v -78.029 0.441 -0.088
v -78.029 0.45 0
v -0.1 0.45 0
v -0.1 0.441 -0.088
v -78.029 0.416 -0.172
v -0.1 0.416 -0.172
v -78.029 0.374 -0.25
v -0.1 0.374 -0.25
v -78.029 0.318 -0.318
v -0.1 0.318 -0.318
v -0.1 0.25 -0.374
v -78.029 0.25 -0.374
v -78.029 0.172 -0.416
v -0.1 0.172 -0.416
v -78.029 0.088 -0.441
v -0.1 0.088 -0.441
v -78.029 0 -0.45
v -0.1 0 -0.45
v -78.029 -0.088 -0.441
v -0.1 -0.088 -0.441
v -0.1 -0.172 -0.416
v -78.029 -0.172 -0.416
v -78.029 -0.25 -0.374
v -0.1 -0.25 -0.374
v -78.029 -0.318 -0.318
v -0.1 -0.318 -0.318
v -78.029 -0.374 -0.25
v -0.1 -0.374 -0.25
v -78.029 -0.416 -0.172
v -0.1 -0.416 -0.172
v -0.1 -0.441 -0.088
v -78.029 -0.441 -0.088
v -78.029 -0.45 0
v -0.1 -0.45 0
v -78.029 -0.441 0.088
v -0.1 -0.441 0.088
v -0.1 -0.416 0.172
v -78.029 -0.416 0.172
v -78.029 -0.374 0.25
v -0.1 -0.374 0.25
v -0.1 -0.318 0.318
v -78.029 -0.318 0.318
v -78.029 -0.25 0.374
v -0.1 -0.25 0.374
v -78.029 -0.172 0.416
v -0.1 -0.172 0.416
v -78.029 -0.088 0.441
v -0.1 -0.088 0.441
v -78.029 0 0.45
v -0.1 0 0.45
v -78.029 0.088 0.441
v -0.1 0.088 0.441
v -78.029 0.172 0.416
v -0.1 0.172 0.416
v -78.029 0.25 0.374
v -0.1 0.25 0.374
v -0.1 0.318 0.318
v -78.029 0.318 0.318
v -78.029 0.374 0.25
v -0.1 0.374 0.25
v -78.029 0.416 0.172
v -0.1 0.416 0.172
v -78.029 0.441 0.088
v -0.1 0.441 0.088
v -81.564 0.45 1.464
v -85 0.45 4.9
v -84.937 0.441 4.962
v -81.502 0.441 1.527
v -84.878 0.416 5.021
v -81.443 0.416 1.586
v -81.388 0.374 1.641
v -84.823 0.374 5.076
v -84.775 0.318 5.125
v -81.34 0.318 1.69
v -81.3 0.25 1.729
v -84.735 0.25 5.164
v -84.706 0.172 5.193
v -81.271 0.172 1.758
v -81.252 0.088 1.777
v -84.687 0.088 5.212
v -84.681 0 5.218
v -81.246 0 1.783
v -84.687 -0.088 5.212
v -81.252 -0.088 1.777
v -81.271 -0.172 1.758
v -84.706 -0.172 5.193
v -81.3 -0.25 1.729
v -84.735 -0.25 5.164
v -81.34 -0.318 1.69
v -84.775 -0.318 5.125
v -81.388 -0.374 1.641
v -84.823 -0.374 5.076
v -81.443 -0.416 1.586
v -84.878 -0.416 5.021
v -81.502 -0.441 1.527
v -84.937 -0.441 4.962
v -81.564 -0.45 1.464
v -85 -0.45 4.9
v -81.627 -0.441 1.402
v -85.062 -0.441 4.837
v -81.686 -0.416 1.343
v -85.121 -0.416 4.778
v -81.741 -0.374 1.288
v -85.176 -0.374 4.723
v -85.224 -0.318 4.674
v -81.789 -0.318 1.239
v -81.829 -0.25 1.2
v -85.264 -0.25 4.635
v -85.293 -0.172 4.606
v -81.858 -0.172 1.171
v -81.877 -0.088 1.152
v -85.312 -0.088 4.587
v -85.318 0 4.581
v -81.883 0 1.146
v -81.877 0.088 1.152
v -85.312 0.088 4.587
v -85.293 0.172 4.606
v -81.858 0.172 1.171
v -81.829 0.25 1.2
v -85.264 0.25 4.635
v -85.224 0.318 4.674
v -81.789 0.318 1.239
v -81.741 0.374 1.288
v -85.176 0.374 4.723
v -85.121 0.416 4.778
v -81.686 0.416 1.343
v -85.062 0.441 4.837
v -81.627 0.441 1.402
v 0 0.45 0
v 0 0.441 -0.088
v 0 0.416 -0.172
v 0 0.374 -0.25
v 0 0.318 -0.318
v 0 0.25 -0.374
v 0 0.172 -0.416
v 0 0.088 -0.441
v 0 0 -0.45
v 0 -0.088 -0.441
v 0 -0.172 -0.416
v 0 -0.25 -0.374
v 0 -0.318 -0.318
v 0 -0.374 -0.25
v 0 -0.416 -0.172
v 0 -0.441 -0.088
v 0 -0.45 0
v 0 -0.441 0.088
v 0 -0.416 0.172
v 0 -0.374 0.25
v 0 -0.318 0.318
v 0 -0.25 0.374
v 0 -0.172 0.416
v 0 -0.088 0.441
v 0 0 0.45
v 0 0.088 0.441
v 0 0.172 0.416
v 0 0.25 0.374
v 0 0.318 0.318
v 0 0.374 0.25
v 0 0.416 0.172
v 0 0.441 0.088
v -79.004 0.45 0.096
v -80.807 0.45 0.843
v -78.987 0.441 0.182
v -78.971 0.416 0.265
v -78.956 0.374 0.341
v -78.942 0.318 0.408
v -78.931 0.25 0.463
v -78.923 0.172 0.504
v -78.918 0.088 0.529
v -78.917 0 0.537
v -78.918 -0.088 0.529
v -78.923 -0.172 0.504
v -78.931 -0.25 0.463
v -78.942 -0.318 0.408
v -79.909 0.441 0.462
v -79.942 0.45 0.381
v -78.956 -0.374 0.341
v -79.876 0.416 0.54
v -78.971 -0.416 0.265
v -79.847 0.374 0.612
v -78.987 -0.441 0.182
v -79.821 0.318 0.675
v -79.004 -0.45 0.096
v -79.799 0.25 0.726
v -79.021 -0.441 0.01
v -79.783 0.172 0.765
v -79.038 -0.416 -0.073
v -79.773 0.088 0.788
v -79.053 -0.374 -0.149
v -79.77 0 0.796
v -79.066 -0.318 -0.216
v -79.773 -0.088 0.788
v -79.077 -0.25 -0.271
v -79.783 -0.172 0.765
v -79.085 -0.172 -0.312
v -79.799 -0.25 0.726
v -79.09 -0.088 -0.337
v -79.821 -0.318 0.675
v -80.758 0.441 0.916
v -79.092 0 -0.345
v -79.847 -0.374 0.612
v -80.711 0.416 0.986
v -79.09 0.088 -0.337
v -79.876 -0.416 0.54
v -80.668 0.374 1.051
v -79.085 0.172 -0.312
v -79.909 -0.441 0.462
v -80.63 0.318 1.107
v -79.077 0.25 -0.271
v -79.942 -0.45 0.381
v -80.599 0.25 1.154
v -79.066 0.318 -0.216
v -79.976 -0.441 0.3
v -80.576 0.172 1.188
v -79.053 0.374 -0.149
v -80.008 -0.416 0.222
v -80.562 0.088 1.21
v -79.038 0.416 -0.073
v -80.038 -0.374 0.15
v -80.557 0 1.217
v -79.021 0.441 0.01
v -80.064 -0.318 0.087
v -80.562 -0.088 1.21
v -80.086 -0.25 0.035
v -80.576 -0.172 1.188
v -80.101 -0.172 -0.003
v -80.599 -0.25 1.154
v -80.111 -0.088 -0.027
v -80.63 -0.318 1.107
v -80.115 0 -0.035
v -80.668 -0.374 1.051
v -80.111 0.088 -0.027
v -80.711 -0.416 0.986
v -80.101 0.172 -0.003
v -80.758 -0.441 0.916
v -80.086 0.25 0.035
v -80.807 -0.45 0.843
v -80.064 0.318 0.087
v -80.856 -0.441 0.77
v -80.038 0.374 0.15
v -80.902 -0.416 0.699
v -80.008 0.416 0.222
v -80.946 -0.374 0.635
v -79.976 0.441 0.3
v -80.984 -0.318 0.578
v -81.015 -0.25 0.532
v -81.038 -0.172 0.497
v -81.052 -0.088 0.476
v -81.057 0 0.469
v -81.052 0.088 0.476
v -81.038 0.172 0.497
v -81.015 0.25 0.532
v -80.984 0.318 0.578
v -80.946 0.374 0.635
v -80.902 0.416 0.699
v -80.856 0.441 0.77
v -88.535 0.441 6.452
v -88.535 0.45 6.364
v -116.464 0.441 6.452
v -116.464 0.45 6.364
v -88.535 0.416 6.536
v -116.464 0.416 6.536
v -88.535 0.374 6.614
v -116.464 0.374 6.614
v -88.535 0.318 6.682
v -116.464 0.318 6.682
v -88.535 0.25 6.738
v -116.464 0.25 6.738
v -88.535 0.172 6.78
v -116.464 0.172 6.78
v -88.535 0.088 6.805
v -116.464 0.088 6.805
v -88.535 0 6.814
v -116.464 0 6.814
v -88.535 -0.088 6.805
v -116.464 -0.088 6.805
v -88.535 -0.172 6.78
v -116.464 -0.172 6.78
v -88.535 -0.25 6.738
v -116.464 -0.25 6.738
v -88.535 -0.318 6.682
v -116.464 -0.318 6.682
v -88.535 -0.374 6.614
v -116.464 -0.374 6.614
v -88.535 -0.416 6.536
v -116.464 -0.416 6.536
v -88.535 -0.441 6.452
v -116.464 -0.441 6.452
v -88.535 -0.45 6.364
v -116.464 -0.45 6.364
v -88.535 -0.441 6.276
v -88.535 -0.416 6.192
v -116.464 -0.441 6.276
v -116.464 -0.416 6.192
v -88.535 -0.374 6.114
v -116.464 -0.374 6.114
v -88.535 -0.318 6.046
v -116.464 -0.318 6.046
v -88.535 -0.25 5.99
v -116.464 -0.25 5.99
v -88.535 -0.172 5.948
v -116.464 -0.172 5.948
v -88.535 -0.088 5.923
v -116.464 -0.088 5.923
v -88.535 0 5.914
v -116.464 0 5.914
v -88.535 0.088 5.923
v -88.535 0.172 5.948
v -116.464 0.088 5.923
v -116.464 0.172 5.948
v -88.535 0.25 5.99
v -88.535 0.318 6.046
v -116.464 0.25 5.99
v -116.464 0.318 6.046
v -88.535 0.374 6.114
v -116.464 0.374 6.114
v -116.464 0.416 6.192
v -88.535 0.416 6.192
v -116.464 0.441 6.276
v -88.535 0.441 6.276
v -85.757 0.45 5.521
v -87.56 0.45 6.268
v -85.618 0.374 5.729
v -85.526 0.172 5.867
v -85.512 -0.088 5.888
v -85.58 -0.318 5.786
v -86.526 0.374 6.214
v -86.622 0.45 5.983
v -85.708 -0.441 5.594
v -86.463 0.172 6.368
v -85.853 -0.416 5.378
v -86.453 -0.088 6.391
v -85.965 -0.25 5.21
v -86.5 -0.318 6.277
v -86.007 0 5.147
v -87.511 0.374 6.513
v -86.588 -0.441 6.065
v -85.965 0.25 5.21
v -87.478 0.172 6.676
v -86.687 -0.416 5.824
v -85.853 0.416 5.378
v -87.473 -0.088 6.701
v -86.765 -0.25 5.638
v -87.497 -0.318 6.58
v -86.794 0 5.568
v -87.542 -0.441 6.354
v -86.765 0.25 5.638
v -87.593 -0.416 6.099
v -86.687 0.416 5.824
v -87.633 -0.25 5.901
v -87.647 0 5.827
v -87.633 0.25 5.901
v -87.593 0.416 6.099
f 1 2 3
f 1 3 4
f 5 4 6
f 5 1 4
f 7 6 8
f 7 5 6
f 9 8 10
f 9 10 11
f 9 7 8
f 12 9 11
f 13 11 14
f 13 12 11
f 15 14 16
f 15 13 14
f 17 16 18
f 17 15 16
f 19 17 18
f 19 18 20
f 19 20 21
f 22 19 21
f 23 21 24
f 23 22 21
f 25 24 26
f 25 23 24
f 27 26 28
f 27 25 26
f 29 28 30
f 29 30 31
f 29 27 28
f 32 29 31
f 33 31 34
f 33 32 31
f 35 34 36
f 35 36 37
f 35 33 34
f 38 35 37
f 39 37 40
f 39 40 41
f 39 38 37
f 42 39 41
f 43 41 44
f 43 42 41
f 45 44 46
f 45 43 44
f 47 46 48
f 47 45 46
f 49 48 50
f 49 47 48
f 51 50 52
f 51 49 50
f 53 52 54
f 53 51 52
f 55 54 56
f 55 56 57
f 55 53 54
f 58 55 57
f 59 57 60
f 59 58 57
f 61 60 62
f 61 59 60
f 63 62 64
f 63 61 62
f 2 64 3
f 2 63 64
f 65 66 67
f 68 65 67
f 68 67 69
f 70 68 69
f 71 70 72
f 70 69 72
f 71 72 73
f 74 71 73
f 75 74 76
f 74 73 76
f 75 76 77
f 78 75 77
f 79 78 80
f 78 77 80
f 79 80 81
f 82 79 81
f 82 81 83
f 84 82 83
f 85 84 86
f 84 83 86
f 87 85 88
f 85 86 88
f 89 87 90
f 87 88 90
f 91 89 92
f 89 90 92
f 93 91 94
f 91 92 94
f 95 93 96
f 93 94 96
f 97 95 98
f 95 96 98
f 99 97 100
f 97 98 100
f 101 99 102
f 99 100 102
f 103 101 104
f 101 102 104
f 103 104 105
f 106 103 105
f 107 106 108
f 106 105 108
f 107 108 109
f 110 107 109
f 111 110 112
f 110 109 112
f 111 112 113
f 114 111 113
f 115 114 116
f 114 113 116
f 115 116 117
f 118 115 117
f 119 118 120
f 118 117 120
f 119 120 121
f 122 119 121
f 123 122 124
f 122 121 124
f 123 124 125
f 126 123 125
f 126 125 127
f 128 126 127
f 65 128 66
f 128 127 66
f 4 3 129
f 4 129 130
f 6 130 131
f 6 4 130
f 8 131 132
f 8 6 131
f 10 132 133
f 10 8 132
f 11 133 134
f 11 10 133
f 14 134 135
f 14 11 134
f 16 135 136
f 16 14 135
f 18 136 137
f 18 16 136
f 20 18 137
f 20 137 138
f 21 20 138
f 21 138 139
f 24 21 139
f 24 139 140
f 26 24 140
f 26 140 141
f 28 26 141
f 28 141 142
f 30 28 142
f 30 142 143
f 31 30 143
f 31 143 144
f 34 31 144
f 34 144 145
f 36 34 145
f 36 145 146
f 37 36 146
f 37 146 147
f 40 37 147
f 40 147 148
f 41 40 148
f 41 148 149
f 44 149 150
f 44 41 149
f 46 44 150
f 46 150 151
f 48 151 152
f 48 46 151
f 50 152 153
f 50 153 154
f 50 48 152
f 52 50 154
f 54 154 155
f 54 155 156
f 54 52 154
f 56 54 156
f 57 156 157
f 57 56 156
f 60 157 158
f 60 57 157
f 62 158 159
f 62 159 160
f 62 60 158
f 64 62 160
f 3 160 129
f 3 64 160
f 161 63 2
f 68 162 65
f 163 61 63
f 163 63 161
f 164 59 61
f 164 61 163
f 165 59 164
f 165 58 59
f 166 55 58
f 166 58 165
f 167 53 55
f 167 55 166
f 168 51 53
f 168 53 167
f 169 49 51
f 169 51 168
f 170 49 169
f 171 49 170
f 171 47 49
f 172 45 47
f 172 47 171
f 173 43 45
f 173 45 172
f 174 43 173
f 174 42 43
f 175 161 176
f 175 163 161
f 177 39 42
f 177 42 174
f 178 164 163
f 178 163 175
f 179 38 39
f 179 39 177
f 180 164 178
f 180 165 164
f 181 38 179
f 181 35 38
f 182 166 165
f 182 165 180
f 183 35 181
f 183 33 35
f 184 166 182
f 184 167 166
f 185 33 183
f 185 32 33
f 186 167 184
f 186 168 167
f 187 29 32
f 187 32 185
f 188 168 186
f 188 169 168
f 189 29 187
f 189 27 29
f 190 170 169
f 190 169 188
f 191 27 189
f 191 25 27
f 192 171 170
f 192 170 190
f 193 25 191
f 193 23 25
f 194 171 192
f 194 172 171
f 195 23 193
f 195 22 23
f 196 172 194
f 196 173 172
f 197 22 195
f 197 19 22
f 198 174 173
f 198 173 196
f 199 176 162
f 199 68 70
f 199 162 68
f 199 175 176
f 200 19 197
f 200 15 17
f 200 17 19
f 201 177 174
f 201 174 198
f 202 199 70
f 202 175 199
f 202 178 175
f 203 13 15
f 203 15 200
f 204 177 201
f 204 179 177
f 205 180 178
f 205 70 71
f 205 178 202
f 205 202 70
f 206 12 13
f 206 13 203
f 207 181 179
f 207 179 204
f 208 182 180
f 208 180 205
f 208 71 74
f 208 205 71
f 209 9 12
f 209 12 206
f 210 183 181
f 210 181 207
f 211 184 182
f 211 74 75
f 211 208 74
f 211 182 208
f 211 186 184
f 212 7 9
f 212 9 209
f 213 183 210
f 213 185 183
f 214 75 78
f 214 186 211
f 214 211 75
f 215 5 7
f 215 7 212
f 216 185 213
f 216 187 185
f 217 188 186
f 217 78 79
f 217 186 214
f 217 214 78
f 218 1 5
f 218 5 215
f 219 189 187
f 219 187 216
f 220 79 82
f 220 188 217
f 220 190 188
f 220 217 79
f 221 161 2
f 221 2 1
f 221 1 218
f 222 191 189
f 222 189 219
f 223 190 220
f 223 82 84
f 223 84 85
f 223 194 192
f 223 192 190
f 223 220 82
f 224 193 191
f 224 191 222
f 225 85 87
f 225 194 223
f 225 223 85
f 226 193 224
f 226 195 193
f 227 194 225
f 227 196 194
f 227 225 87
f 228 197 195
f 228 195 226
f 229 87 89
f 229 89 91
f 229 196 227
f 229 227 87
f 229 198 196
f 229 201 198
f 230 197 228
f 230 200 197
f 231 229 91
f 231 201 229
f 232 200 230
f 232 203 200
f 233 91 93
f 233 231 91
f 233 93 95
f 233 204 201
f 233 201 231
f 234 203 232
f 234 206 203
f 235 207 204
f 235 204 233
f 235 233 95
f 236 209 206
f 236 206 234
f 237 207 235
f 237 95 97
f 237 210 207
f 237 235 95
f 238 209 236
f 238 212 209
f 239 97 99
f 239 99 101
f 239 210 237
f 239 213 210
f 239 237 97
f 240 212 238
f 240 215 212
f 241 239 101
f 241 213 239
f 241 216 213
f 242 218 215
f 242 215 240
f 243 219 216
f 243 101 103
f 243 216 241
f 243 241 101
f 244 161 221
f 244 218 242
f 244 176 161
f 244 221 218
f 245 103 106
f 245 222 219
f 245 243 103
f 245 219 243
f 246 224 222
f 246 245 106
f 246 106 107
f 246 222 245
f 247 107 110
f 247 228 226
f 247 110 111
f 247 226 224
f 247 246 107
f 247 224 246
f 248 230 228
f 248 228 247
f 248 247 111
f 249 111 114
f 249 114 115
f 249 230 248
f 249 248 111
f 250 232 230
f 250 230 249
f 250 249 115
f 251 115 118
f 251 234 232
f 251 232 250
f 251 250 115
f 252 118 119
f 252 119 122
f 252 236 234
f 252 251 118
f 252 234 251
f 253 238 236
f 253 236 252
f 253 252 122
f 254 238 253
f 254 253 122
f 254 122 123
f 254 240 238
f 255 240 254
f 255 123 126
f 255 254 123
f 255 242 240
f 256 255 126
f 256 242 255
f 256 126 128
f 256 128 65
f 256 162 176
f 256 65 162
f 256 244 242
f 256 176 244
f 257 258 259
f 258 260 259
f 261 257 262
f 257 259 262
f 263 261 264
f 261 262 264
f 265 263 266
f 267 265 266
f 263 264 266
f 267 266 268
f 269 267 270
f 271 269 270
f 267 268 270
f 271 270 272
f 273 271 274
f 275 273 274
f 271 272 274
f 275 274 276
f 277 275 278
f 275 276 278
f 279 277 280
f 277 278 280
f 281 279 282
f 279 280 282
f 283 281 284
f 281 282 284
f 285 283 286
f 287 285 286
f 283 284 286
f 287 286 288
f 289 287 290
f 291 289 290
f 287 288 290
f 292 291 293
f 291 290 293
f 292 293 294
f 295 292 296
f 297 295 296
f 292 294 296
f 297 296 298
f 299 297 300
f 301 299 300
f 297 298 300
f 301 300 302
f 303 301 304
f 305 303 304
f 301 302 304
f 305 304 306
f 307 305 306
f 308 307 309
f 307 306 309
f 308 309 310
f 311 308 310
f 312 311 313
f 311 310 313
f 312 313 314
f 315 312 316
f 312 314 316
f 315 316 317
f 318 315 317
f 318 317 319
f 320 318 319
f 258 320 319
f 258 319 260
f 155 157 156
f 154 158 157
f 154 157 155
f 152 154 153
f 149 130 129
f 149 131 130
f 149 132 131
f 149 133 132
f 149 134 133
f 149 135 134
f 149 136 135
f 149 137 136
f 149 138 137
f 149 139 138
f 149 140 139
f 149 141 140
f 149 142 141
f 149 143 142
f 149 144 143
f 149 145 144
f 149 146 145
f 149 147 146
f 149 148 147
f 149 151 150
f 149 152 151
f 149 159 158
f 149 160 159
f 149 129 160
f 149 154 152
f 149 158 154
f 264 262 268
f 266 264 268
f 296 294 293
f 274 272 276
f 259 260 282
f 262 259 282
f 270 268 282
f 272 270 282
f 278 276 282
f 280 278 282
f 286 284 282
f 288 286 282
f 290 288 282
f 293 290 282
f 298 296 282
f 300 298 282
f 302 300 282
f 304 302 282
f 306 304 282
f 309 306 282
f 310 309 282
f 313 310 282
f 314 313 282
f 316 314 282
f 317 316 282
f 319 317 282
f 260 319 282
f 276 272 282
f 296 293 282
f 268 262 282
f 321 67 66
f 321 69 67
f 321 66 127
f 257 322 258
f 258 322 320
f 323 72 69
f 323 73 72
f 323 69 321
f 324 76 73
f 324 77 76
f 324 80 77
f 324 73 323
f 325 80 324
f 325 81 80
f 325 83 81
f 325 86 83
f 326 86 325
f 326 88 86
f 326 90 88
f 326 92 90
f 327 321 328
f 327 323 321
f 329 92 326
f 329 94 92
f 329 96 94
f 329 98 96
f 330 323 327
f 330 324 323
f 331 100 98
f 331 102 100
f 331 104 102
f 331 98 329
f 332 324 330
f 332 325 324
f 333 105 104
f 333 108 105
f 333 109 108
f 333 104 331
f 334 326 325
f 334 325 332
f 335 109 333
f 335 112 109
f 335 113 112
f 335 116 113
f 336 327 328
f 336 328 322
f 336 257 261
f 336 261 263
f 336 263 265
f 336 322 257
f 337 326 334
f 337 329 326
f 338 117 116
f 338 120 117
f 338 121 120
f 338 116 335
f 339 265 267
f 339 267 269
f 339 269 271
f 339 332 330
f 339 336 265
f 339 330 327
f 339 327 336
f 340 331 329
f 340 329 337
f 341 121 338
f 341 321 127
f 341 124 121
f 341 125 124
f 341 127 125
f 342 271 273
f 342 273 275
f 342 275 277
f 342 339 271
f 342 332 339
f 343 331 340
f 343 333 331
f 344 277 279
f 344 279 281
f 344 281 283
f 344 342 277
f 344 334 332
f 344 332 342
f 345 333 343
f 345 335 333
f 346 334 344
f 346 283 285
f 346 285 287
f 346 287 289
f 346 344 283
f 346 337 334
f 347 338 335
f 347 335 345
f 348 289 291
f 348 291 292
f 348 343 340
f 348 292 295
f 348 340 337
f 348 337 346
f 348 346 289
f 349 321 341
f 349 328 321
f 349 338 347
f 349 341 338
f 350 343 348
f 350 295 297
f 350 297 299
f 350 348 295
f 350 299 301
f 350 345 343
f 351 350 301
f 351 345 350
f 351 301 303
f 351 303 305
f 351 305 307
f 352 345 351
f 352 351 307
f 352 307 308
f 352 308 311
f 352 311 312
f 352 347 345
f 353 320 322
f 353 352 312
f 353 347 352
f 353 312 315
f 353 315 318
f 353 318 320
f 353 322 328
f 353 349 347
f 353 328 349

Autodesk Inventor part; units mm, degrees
ref_plane "YZ Plane" through (0, 0, 0) normal (1, 0, 0) x (0, 1, 0)
ref_plane "XZ Plane" through (0, 0, 0) normal (0, 1, 0) x (-1, 0, 0)
ref_plane "XY Plane" through (0, 0, 0) normal (0, 0, 1) x (1, 0, 0)
sketch "Sketch1" plane through (0, 0, 0) normal (1, 0, 0) x (0, 1, 0)
  circle A0 centre (0, 0) radius 0.45
  dimension "d0" = 0.9
sketch "Sketch2" plane through (0, 0, 0) normal (0, 1, 0) x (-1, 0, 0)
  line L0 (0, 0) -> (0.1, 0)
  line L1 (0.1, 0) -> (78.0289, 0)
  line L2 (81.5645, 1.4645) -> (84.9995, 4.8995)
  line L3 (88.535, 6.364) -> (116.464, 6.364)
  arc A0 (88.535, 6.364) -> (84.9995, 4.8995) centre (88.535, 1.364) ccw
  arc A1 (78.0289, 0) -> (81.5645, 1.4645) centre (78.0289, 5) ccw
  point P0 (80.1, 0)
  point P1 (86.464, 6.364)
  dimension "d1" = 0.1
  dimension "d4" = 80
  dimension "d6" = 9
  dimension "d7" = 30
  dimension "d8" = 5
sweep "Sweep2" add profiles "Sketch1" path "Sketch2"
properties part number "cable medio"
